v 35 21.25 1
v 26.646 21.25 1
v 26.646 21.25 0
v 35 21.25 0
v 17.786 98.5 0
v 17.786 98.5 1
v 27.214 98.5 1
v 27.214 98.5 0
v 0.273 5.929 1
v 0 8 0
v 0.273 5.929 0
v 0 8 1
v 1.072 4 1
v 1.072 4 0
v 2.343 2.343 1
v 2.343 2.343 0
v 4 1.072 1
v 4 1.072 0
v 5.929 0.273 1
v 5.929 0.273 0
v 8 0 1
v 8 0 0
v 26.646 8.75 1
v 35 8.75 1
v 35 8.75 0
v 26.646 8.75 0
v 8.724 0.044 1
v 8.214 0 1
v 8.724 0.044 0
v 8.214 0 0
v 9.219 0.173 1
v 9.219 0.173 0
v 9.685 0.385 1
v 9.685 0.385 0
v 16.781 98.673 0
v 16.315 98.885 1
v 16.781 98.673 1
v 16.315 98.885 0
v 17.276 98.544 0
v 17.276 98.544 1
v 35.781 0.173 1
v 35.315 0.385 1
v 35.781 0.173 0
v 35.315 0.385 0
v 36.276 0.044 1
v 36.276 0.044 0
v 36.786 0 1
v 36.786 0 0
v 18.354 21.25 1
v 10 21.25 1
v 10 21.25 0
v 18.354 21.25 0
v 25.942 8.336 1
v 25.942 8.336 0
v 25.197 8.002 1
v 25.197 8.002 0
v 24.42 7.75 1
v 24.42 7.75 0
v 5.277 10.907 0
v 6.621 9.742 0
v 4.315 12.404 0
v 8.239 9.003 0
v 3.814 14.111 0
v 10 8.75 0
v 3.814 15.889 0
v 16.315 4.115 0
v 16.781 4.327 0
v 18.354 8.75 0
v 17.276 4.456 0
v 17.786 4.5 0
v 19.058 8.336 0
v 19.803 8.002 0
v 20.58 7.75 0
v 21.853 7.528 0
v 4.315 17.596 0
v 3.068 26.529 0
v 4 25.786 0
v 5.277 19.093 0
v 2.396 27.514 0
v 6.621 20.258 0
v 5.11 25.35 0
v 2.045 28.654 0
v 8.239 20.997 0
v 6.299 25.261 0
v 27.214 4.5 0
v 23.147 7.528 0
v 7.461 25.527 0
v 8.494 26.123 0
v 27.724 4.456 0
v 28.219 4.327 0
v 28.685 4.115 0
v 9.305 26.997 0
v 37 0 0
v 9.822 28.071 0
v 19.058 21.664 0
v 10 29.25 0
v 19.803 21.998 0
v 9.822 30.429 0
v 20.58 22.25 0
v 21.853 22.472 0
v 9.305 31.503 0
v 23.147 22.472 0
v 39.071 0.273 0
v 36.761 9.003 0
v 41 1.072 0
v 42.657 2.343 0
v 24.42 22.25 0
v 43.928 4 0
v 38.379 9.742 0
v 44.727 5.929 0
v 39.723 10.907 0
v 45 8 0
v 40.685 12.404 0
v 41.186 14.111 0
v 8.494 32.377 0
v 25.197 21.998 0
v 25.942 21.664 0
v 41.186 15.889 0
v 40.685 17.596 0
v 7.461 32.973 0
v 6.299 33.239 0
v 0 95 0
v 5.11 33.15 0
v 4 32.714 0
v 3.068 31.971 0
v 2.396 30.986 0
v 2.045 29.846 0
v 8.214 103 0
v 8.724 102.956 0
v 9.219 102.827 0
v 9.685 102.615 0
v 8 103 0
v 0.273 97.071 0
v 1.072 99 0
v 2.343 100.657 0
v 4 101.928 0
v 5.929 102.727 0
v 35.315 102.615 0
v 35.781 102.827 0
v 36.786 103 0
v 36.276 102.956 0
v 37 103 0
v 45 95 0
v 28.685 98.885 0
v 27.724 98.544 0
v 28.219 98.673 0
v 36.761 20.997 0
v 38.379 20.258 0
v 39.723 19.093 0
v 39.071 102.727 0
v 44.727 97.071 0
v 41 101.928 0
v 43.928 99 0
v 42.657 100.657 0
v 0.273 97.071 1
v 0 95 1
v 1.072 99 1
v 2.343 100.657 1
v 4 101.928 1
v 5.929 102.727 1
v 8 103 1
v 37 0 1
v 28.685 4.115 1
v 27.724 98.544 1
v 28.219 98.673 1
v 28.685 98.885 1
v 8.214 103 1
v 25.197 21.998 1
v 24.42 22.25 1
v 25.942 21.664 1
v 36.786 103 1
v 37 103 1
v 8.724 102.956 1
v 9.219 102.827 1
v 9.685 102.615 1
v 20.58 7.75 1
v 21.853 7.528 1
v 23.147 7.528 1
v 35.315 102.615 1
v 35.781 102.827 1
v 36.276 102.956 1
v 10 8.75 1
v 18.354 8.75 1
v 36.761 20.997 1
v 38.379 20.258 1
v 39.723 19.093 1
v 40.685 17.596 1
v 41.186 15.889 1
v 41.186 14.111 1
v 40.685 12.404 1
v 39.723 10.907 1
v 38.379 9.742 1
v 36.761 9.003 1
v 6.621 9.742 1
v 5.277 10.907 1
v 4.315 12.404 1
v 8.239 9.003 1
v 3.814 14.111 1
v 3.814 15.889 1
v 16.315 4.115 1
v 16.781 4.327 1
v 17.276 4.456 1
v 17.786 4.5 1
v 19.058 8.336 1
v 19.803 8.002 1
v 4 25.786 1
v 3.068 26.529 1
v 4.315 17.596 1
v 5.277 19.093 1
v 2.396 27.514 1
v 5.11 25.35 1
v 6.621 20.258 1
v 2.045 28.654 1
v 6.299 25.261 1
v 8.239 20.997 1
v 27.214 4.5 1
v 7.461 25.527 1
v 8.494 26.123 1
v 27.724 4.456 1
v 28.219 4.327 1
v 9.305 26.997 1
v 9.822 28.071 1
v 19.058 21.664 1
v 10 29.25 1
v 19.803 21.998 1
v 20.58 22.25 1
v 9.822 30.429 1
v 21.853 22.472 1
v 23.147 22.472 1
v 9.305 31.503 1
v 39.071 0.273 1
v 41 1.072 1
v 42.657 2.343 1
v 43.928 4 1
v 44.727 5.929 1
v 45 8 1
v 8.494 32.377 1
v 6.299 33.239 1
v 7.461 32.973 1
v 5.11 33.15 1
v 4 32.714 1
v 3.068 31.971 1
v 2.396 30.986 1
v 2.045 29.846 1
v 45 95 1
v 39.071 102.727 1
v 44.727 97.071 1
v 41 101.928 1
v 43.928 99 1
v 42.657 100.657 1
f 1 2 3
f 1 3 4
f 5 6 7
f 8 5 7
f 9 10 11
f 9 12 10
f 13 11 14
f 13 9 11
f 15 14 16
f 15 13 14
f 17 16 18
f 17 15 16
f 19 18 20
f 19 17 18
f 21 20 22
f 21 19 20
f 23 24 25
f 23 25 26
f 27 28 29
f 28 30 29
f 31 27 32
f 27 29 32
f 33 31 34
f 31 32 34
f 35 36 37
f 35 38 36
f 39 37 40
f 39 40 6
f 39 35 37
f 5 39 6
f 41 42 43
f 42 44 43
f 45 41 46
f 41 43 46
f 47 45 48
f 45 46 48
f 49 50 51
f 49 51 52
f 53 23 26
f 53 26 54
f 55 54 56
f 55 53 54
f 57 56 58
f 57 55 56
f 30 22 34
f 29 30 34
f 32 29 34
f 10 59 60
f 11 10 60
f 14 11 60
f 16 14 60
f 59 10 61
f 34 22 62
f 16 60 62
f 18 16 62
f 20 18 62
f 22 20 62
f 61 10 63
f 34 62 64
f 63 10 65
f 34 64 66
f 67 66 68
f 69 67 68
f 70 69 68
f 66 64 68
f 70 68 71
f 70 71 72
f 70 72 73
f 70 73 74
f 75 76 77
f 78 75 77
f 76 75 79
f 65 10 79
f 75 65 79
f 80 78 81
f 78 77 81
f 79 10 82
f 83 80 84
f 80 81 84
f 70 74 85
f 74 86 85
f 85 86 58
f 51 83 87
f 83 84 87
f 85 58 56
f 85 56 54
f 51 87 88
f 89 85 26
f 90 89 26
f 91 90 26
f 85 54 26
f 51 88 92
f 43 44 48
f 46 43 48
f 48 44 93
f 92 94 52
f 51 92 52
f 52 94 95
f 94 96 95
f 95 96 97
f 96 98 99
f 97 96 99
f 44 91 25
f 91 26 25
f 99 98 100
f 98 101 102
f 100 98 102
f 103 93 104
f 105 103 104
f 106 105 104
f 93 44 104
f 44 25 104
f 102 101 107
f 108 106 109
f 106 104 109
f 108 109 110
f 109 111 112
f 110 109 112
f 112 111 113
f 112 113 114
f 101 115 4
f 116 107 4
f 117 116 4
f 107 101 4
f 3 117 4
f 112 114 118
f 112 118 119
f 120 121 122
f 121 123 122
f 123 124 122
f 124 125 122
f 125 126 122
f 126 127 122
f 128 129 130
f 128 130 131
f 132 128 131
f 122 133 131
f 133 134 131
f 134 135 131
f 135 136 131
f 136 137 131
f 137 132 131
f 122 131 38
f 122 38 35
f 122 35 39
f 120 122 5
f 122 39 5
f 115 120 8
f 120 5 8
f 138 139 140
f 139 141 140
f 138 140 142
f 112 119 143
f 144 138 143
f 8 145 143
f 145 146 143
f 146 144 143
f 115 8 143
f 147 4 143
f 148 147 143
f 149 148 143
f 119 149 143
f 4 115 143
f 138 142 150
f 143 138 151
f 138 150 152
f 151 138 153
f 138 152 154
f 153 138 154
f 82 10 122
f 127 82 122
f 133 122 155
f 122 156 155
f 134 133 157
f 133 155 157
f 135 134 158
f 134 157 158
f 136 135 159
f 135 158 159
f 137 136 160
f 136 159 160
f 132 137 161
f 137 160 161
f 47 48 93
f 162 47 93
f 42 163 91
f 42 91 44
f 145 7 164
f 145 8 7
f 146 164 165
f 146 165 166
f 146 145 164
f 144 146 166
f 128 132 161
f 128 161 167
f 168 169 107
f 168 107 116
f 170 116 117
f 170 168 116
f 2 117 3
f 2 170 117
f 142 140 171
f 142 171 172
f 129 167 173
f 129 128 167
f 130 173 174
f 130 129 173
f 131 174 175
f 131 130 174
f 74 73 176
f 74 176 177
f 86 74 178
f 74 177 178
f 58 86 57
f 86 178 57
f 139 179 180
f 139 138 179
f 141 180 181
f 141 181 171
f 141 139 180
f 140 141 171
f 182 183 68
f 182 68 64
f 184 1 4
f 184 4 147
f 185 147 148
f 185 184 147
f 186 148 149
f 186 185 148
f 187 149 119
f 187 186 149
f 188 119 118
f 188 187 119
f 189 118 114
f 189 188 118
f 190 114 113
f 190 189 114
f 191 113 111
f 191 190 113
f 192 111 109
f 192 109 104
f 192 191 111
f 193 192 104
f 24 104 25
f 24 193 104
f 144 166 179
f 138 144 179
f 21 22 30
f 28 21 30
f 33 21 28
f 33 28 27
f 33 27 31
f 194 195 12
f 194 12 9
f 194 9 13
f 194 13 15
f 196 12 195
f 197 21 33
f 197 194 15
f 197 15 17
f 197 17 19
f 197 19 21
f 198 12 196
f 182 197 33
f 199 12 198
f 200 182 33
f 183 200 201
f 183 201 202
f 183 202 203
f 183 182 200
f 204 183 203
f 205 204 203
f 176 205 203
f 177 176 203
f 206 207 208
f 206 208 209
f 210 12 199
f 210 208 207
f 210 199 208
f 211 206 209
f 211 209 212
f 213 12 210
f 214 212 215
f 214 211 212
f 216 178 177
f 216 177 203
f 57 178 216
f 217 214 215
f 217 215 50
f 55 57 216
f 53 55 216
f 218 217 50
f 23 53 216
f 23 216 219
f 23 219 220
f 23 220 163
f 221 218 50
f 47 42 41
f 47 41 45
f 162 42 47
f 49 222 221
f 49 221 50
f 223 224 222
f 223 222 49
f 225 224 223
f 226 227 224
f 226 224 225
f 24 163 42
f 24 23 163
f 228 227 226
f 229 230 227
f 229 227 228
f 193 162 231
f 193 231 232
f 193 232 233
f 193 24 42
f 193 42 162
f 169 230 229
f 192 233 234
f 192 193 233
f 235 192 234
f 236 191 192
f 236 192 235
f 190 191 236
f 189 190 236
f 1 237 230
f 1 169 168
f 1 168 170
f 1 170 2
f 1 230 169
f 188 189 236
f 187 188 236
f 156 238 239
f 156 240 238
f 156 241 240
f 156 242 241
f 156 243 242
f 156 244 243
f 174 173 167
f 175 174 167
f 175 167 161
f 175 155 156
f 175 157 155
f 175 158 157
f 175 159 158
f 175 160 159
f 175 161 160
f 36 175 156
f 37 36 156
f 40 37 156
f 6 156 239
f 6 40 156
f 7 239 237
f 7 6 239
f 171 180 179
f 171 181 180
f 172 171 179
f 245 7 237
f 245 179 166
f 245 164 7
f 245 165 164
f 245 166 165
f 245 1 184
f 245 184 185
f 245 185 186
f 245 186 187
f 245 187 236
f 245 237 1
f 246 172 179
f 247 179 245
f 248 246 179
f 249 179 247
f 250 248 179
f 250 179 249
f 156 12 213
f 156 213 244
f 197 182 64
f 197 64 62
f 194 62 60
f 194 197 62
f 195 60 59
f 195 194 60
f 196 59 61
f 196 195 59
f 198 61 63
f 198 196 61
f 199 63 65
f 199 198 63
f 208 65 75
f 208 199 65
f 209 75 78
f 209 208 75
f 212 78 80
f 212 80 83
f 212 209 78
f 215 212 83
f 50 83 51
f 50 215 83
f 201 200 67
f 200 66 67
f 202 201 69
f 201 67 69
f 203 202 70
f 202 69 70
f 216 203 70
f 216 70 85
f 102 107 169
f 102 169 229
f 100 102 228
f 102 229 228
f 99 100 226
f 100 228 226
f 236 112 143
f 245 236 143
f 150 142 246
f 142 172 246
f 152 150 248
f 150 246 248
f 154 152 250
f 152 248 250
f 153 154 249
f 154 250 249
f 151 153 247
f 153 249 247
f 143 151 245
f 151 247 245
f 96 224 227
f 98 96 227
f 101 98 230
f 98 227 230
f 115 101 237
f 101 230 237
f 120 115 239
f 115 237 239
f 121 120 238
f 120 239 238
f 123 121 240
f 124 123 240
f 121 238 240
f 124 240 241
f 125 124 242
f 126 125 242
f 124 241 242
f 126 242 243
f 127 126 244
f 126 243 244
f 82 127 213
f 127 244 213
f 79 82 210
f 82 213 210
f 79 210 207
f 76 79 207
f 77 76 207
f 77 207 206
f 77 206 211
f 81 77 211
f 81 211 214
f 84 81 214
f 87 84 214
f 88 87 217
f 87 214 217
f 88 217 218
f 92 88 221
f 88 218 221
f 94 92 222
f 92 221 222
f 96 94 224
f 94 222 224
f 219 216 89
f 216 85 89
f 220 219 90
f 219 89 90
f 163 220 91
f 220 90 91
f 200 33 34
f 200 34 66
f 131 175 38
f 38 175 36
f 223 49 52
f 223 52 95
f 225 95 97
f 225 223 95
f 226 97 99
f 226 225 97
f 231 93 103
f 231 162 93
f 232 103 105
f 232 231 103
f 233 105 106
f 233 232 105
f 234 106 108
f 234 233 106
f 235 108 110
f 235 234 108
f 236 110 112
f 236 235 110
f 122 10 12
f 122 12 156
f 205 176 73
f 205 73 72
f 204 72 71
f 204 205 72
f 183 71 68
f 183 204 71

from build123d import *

# Parameters (mm, degrees)
SKETCH1_W           = 45
SKETCH1_H           = 103
BOSS_EXTRUDE1_DEPTH = 1
FILLET1_R           = 8
SKETCH2_R           = 4
CUT_EXTRUDE1_DEPTH  = 1
CUT_EXTRUDE2_DEPTH  = 1
BOSS_EXTRUDE2_DEPTH = 1
SKETCH5_R           = 7.5
CUT_EXTRUDE3_DEPTH  = 10
FILLET2_R           = 3


with BuildPart() as part:
    # Sketch1 → Boss-Extrude1 (new body)
    with BuildSketch(Plane.XY):
        with Locations((22.5, 51.5)):
            Rectangle(SKETCH1_W, SKETCH1_H)
        with BuildLine():
            Line((10.75, 22.25), (34.25, 22.25))
            ThreePointArc((34.25, 22.25), (41.5, 15), (34.25, 7.75))
            Line((34.25, 7.75), (10.75, 7.75))
            ThreePointArc((10.75, 7.75), (3.5, 15), (10.75, 22.25))
        make_face(mode=Mode.SUBTRACT)
    extrude(amount=BOSS_EXTRUDE1_DEPTH)

    # Fillet1
    fillet1_edges = [part.edges().sort_by_distance(p)[0] for p in [
        (0, 103, 0.5),
        (45, 103, 0.5),
        (45, 0, 0.5),
        (0, 0, 0.5),
    ]]
    fillet(fillet1_edges, radius=FILLET1_R)

    # Sketch2 → Cut-Extrude1 (cut)
    with BuildSketch(Plane.XY.offset(1)):
        with Locations((6, 29.25)):
            Circle(SKETCH2_R)
    extrude(amount=-CUT_EXTRUDE1_DEPTH, mode=Mode.SUBTRACT)

    # Sketch3 → Cut-Extrude2 (cut)
    with BuildSketch(Plane.XY.offset(1)):
        Polygon((17, 98.5), (28, 98.5), (36, 103), (9, 103), align=None)
        Polygon((17, 4.5), (28, 4.5), (36, 0), (9, 0), align=None)
    extrude(amount=-CUT_EXTRUDE2_DEPTH, mode=Mode.SUBTRACT)

    # Sketch4 → Boss-Extrude2 (add)
    with BuildSketch(Plane.XY.offset(1)):
        with BuildLine():
            Line((9.607201991, 23.81242846), (35.392798009, 23.81242846))
            ThreePointArc((35.392798009, 23.81242846), (44.205226468, 15), (35.392798009, 6.18757154))
            Line((35.392798009, 6.18757154), (9.607201991, 6.18757154))
            ThreePointArc((9.607201991, 6.18757154), (0.794773532, 15), (9.607201991, 23.81242846))
        make_face()
        with BuildLine():
            Line((10, 21.25), (18.354219012, 21.25))
            ThreePointArc((18.354219012, 21.25), (22.5, 22.5), (26.645780988, 21.25))
            Line((26.645780988, 21.25), (35, 21.25))
            ThreePointArc((35, 21.25), (41.25, 15), (35, 8.75))
            Line((35, 8.75), (26.645780988, 8.75))
            ThreePointArc((26.645780988, 8.75), (22.5, 7.5), (18.354219012, 8.75))
            Line((18.354219012, 8.75), (10, 8.75))
            ThreePointArc((10, 8.75), (3.75, 15), (10, 21.25))
        make_face(mode=Mode.SUBTRACT)
    extrude(amount=-BOSS_EXTRUDE2_DEPTH)

    # Sketch5 → Cut-Extrude3 (cut)
    with BuildSketch(Plane.XY.offset(1)):
        with Locations((22.5, 15)):
            Circle(SKETCH5_R)
    extrude(amount=-CUT_EXTRUDE3_DEPTH, mode=Mode.SUBTRACT)

    # Fillet2
    fillet2_edges = [part.edges().sort_by_distance(p)[0] for p in [
        (36, 103, 0.5),
        (28, 98.5, 0.5),
        (17, 98.5, 0.5),
        (9, 103, 0.5),
        (28, 4.5, 0.5),
        (36, 0, 0.5),
        (9, 0, 0.5),
        (17, 4.5, 0.5),
    ]]
    fillet(fillet2_edges, radius=FILLET2_R)


solid = part.part
